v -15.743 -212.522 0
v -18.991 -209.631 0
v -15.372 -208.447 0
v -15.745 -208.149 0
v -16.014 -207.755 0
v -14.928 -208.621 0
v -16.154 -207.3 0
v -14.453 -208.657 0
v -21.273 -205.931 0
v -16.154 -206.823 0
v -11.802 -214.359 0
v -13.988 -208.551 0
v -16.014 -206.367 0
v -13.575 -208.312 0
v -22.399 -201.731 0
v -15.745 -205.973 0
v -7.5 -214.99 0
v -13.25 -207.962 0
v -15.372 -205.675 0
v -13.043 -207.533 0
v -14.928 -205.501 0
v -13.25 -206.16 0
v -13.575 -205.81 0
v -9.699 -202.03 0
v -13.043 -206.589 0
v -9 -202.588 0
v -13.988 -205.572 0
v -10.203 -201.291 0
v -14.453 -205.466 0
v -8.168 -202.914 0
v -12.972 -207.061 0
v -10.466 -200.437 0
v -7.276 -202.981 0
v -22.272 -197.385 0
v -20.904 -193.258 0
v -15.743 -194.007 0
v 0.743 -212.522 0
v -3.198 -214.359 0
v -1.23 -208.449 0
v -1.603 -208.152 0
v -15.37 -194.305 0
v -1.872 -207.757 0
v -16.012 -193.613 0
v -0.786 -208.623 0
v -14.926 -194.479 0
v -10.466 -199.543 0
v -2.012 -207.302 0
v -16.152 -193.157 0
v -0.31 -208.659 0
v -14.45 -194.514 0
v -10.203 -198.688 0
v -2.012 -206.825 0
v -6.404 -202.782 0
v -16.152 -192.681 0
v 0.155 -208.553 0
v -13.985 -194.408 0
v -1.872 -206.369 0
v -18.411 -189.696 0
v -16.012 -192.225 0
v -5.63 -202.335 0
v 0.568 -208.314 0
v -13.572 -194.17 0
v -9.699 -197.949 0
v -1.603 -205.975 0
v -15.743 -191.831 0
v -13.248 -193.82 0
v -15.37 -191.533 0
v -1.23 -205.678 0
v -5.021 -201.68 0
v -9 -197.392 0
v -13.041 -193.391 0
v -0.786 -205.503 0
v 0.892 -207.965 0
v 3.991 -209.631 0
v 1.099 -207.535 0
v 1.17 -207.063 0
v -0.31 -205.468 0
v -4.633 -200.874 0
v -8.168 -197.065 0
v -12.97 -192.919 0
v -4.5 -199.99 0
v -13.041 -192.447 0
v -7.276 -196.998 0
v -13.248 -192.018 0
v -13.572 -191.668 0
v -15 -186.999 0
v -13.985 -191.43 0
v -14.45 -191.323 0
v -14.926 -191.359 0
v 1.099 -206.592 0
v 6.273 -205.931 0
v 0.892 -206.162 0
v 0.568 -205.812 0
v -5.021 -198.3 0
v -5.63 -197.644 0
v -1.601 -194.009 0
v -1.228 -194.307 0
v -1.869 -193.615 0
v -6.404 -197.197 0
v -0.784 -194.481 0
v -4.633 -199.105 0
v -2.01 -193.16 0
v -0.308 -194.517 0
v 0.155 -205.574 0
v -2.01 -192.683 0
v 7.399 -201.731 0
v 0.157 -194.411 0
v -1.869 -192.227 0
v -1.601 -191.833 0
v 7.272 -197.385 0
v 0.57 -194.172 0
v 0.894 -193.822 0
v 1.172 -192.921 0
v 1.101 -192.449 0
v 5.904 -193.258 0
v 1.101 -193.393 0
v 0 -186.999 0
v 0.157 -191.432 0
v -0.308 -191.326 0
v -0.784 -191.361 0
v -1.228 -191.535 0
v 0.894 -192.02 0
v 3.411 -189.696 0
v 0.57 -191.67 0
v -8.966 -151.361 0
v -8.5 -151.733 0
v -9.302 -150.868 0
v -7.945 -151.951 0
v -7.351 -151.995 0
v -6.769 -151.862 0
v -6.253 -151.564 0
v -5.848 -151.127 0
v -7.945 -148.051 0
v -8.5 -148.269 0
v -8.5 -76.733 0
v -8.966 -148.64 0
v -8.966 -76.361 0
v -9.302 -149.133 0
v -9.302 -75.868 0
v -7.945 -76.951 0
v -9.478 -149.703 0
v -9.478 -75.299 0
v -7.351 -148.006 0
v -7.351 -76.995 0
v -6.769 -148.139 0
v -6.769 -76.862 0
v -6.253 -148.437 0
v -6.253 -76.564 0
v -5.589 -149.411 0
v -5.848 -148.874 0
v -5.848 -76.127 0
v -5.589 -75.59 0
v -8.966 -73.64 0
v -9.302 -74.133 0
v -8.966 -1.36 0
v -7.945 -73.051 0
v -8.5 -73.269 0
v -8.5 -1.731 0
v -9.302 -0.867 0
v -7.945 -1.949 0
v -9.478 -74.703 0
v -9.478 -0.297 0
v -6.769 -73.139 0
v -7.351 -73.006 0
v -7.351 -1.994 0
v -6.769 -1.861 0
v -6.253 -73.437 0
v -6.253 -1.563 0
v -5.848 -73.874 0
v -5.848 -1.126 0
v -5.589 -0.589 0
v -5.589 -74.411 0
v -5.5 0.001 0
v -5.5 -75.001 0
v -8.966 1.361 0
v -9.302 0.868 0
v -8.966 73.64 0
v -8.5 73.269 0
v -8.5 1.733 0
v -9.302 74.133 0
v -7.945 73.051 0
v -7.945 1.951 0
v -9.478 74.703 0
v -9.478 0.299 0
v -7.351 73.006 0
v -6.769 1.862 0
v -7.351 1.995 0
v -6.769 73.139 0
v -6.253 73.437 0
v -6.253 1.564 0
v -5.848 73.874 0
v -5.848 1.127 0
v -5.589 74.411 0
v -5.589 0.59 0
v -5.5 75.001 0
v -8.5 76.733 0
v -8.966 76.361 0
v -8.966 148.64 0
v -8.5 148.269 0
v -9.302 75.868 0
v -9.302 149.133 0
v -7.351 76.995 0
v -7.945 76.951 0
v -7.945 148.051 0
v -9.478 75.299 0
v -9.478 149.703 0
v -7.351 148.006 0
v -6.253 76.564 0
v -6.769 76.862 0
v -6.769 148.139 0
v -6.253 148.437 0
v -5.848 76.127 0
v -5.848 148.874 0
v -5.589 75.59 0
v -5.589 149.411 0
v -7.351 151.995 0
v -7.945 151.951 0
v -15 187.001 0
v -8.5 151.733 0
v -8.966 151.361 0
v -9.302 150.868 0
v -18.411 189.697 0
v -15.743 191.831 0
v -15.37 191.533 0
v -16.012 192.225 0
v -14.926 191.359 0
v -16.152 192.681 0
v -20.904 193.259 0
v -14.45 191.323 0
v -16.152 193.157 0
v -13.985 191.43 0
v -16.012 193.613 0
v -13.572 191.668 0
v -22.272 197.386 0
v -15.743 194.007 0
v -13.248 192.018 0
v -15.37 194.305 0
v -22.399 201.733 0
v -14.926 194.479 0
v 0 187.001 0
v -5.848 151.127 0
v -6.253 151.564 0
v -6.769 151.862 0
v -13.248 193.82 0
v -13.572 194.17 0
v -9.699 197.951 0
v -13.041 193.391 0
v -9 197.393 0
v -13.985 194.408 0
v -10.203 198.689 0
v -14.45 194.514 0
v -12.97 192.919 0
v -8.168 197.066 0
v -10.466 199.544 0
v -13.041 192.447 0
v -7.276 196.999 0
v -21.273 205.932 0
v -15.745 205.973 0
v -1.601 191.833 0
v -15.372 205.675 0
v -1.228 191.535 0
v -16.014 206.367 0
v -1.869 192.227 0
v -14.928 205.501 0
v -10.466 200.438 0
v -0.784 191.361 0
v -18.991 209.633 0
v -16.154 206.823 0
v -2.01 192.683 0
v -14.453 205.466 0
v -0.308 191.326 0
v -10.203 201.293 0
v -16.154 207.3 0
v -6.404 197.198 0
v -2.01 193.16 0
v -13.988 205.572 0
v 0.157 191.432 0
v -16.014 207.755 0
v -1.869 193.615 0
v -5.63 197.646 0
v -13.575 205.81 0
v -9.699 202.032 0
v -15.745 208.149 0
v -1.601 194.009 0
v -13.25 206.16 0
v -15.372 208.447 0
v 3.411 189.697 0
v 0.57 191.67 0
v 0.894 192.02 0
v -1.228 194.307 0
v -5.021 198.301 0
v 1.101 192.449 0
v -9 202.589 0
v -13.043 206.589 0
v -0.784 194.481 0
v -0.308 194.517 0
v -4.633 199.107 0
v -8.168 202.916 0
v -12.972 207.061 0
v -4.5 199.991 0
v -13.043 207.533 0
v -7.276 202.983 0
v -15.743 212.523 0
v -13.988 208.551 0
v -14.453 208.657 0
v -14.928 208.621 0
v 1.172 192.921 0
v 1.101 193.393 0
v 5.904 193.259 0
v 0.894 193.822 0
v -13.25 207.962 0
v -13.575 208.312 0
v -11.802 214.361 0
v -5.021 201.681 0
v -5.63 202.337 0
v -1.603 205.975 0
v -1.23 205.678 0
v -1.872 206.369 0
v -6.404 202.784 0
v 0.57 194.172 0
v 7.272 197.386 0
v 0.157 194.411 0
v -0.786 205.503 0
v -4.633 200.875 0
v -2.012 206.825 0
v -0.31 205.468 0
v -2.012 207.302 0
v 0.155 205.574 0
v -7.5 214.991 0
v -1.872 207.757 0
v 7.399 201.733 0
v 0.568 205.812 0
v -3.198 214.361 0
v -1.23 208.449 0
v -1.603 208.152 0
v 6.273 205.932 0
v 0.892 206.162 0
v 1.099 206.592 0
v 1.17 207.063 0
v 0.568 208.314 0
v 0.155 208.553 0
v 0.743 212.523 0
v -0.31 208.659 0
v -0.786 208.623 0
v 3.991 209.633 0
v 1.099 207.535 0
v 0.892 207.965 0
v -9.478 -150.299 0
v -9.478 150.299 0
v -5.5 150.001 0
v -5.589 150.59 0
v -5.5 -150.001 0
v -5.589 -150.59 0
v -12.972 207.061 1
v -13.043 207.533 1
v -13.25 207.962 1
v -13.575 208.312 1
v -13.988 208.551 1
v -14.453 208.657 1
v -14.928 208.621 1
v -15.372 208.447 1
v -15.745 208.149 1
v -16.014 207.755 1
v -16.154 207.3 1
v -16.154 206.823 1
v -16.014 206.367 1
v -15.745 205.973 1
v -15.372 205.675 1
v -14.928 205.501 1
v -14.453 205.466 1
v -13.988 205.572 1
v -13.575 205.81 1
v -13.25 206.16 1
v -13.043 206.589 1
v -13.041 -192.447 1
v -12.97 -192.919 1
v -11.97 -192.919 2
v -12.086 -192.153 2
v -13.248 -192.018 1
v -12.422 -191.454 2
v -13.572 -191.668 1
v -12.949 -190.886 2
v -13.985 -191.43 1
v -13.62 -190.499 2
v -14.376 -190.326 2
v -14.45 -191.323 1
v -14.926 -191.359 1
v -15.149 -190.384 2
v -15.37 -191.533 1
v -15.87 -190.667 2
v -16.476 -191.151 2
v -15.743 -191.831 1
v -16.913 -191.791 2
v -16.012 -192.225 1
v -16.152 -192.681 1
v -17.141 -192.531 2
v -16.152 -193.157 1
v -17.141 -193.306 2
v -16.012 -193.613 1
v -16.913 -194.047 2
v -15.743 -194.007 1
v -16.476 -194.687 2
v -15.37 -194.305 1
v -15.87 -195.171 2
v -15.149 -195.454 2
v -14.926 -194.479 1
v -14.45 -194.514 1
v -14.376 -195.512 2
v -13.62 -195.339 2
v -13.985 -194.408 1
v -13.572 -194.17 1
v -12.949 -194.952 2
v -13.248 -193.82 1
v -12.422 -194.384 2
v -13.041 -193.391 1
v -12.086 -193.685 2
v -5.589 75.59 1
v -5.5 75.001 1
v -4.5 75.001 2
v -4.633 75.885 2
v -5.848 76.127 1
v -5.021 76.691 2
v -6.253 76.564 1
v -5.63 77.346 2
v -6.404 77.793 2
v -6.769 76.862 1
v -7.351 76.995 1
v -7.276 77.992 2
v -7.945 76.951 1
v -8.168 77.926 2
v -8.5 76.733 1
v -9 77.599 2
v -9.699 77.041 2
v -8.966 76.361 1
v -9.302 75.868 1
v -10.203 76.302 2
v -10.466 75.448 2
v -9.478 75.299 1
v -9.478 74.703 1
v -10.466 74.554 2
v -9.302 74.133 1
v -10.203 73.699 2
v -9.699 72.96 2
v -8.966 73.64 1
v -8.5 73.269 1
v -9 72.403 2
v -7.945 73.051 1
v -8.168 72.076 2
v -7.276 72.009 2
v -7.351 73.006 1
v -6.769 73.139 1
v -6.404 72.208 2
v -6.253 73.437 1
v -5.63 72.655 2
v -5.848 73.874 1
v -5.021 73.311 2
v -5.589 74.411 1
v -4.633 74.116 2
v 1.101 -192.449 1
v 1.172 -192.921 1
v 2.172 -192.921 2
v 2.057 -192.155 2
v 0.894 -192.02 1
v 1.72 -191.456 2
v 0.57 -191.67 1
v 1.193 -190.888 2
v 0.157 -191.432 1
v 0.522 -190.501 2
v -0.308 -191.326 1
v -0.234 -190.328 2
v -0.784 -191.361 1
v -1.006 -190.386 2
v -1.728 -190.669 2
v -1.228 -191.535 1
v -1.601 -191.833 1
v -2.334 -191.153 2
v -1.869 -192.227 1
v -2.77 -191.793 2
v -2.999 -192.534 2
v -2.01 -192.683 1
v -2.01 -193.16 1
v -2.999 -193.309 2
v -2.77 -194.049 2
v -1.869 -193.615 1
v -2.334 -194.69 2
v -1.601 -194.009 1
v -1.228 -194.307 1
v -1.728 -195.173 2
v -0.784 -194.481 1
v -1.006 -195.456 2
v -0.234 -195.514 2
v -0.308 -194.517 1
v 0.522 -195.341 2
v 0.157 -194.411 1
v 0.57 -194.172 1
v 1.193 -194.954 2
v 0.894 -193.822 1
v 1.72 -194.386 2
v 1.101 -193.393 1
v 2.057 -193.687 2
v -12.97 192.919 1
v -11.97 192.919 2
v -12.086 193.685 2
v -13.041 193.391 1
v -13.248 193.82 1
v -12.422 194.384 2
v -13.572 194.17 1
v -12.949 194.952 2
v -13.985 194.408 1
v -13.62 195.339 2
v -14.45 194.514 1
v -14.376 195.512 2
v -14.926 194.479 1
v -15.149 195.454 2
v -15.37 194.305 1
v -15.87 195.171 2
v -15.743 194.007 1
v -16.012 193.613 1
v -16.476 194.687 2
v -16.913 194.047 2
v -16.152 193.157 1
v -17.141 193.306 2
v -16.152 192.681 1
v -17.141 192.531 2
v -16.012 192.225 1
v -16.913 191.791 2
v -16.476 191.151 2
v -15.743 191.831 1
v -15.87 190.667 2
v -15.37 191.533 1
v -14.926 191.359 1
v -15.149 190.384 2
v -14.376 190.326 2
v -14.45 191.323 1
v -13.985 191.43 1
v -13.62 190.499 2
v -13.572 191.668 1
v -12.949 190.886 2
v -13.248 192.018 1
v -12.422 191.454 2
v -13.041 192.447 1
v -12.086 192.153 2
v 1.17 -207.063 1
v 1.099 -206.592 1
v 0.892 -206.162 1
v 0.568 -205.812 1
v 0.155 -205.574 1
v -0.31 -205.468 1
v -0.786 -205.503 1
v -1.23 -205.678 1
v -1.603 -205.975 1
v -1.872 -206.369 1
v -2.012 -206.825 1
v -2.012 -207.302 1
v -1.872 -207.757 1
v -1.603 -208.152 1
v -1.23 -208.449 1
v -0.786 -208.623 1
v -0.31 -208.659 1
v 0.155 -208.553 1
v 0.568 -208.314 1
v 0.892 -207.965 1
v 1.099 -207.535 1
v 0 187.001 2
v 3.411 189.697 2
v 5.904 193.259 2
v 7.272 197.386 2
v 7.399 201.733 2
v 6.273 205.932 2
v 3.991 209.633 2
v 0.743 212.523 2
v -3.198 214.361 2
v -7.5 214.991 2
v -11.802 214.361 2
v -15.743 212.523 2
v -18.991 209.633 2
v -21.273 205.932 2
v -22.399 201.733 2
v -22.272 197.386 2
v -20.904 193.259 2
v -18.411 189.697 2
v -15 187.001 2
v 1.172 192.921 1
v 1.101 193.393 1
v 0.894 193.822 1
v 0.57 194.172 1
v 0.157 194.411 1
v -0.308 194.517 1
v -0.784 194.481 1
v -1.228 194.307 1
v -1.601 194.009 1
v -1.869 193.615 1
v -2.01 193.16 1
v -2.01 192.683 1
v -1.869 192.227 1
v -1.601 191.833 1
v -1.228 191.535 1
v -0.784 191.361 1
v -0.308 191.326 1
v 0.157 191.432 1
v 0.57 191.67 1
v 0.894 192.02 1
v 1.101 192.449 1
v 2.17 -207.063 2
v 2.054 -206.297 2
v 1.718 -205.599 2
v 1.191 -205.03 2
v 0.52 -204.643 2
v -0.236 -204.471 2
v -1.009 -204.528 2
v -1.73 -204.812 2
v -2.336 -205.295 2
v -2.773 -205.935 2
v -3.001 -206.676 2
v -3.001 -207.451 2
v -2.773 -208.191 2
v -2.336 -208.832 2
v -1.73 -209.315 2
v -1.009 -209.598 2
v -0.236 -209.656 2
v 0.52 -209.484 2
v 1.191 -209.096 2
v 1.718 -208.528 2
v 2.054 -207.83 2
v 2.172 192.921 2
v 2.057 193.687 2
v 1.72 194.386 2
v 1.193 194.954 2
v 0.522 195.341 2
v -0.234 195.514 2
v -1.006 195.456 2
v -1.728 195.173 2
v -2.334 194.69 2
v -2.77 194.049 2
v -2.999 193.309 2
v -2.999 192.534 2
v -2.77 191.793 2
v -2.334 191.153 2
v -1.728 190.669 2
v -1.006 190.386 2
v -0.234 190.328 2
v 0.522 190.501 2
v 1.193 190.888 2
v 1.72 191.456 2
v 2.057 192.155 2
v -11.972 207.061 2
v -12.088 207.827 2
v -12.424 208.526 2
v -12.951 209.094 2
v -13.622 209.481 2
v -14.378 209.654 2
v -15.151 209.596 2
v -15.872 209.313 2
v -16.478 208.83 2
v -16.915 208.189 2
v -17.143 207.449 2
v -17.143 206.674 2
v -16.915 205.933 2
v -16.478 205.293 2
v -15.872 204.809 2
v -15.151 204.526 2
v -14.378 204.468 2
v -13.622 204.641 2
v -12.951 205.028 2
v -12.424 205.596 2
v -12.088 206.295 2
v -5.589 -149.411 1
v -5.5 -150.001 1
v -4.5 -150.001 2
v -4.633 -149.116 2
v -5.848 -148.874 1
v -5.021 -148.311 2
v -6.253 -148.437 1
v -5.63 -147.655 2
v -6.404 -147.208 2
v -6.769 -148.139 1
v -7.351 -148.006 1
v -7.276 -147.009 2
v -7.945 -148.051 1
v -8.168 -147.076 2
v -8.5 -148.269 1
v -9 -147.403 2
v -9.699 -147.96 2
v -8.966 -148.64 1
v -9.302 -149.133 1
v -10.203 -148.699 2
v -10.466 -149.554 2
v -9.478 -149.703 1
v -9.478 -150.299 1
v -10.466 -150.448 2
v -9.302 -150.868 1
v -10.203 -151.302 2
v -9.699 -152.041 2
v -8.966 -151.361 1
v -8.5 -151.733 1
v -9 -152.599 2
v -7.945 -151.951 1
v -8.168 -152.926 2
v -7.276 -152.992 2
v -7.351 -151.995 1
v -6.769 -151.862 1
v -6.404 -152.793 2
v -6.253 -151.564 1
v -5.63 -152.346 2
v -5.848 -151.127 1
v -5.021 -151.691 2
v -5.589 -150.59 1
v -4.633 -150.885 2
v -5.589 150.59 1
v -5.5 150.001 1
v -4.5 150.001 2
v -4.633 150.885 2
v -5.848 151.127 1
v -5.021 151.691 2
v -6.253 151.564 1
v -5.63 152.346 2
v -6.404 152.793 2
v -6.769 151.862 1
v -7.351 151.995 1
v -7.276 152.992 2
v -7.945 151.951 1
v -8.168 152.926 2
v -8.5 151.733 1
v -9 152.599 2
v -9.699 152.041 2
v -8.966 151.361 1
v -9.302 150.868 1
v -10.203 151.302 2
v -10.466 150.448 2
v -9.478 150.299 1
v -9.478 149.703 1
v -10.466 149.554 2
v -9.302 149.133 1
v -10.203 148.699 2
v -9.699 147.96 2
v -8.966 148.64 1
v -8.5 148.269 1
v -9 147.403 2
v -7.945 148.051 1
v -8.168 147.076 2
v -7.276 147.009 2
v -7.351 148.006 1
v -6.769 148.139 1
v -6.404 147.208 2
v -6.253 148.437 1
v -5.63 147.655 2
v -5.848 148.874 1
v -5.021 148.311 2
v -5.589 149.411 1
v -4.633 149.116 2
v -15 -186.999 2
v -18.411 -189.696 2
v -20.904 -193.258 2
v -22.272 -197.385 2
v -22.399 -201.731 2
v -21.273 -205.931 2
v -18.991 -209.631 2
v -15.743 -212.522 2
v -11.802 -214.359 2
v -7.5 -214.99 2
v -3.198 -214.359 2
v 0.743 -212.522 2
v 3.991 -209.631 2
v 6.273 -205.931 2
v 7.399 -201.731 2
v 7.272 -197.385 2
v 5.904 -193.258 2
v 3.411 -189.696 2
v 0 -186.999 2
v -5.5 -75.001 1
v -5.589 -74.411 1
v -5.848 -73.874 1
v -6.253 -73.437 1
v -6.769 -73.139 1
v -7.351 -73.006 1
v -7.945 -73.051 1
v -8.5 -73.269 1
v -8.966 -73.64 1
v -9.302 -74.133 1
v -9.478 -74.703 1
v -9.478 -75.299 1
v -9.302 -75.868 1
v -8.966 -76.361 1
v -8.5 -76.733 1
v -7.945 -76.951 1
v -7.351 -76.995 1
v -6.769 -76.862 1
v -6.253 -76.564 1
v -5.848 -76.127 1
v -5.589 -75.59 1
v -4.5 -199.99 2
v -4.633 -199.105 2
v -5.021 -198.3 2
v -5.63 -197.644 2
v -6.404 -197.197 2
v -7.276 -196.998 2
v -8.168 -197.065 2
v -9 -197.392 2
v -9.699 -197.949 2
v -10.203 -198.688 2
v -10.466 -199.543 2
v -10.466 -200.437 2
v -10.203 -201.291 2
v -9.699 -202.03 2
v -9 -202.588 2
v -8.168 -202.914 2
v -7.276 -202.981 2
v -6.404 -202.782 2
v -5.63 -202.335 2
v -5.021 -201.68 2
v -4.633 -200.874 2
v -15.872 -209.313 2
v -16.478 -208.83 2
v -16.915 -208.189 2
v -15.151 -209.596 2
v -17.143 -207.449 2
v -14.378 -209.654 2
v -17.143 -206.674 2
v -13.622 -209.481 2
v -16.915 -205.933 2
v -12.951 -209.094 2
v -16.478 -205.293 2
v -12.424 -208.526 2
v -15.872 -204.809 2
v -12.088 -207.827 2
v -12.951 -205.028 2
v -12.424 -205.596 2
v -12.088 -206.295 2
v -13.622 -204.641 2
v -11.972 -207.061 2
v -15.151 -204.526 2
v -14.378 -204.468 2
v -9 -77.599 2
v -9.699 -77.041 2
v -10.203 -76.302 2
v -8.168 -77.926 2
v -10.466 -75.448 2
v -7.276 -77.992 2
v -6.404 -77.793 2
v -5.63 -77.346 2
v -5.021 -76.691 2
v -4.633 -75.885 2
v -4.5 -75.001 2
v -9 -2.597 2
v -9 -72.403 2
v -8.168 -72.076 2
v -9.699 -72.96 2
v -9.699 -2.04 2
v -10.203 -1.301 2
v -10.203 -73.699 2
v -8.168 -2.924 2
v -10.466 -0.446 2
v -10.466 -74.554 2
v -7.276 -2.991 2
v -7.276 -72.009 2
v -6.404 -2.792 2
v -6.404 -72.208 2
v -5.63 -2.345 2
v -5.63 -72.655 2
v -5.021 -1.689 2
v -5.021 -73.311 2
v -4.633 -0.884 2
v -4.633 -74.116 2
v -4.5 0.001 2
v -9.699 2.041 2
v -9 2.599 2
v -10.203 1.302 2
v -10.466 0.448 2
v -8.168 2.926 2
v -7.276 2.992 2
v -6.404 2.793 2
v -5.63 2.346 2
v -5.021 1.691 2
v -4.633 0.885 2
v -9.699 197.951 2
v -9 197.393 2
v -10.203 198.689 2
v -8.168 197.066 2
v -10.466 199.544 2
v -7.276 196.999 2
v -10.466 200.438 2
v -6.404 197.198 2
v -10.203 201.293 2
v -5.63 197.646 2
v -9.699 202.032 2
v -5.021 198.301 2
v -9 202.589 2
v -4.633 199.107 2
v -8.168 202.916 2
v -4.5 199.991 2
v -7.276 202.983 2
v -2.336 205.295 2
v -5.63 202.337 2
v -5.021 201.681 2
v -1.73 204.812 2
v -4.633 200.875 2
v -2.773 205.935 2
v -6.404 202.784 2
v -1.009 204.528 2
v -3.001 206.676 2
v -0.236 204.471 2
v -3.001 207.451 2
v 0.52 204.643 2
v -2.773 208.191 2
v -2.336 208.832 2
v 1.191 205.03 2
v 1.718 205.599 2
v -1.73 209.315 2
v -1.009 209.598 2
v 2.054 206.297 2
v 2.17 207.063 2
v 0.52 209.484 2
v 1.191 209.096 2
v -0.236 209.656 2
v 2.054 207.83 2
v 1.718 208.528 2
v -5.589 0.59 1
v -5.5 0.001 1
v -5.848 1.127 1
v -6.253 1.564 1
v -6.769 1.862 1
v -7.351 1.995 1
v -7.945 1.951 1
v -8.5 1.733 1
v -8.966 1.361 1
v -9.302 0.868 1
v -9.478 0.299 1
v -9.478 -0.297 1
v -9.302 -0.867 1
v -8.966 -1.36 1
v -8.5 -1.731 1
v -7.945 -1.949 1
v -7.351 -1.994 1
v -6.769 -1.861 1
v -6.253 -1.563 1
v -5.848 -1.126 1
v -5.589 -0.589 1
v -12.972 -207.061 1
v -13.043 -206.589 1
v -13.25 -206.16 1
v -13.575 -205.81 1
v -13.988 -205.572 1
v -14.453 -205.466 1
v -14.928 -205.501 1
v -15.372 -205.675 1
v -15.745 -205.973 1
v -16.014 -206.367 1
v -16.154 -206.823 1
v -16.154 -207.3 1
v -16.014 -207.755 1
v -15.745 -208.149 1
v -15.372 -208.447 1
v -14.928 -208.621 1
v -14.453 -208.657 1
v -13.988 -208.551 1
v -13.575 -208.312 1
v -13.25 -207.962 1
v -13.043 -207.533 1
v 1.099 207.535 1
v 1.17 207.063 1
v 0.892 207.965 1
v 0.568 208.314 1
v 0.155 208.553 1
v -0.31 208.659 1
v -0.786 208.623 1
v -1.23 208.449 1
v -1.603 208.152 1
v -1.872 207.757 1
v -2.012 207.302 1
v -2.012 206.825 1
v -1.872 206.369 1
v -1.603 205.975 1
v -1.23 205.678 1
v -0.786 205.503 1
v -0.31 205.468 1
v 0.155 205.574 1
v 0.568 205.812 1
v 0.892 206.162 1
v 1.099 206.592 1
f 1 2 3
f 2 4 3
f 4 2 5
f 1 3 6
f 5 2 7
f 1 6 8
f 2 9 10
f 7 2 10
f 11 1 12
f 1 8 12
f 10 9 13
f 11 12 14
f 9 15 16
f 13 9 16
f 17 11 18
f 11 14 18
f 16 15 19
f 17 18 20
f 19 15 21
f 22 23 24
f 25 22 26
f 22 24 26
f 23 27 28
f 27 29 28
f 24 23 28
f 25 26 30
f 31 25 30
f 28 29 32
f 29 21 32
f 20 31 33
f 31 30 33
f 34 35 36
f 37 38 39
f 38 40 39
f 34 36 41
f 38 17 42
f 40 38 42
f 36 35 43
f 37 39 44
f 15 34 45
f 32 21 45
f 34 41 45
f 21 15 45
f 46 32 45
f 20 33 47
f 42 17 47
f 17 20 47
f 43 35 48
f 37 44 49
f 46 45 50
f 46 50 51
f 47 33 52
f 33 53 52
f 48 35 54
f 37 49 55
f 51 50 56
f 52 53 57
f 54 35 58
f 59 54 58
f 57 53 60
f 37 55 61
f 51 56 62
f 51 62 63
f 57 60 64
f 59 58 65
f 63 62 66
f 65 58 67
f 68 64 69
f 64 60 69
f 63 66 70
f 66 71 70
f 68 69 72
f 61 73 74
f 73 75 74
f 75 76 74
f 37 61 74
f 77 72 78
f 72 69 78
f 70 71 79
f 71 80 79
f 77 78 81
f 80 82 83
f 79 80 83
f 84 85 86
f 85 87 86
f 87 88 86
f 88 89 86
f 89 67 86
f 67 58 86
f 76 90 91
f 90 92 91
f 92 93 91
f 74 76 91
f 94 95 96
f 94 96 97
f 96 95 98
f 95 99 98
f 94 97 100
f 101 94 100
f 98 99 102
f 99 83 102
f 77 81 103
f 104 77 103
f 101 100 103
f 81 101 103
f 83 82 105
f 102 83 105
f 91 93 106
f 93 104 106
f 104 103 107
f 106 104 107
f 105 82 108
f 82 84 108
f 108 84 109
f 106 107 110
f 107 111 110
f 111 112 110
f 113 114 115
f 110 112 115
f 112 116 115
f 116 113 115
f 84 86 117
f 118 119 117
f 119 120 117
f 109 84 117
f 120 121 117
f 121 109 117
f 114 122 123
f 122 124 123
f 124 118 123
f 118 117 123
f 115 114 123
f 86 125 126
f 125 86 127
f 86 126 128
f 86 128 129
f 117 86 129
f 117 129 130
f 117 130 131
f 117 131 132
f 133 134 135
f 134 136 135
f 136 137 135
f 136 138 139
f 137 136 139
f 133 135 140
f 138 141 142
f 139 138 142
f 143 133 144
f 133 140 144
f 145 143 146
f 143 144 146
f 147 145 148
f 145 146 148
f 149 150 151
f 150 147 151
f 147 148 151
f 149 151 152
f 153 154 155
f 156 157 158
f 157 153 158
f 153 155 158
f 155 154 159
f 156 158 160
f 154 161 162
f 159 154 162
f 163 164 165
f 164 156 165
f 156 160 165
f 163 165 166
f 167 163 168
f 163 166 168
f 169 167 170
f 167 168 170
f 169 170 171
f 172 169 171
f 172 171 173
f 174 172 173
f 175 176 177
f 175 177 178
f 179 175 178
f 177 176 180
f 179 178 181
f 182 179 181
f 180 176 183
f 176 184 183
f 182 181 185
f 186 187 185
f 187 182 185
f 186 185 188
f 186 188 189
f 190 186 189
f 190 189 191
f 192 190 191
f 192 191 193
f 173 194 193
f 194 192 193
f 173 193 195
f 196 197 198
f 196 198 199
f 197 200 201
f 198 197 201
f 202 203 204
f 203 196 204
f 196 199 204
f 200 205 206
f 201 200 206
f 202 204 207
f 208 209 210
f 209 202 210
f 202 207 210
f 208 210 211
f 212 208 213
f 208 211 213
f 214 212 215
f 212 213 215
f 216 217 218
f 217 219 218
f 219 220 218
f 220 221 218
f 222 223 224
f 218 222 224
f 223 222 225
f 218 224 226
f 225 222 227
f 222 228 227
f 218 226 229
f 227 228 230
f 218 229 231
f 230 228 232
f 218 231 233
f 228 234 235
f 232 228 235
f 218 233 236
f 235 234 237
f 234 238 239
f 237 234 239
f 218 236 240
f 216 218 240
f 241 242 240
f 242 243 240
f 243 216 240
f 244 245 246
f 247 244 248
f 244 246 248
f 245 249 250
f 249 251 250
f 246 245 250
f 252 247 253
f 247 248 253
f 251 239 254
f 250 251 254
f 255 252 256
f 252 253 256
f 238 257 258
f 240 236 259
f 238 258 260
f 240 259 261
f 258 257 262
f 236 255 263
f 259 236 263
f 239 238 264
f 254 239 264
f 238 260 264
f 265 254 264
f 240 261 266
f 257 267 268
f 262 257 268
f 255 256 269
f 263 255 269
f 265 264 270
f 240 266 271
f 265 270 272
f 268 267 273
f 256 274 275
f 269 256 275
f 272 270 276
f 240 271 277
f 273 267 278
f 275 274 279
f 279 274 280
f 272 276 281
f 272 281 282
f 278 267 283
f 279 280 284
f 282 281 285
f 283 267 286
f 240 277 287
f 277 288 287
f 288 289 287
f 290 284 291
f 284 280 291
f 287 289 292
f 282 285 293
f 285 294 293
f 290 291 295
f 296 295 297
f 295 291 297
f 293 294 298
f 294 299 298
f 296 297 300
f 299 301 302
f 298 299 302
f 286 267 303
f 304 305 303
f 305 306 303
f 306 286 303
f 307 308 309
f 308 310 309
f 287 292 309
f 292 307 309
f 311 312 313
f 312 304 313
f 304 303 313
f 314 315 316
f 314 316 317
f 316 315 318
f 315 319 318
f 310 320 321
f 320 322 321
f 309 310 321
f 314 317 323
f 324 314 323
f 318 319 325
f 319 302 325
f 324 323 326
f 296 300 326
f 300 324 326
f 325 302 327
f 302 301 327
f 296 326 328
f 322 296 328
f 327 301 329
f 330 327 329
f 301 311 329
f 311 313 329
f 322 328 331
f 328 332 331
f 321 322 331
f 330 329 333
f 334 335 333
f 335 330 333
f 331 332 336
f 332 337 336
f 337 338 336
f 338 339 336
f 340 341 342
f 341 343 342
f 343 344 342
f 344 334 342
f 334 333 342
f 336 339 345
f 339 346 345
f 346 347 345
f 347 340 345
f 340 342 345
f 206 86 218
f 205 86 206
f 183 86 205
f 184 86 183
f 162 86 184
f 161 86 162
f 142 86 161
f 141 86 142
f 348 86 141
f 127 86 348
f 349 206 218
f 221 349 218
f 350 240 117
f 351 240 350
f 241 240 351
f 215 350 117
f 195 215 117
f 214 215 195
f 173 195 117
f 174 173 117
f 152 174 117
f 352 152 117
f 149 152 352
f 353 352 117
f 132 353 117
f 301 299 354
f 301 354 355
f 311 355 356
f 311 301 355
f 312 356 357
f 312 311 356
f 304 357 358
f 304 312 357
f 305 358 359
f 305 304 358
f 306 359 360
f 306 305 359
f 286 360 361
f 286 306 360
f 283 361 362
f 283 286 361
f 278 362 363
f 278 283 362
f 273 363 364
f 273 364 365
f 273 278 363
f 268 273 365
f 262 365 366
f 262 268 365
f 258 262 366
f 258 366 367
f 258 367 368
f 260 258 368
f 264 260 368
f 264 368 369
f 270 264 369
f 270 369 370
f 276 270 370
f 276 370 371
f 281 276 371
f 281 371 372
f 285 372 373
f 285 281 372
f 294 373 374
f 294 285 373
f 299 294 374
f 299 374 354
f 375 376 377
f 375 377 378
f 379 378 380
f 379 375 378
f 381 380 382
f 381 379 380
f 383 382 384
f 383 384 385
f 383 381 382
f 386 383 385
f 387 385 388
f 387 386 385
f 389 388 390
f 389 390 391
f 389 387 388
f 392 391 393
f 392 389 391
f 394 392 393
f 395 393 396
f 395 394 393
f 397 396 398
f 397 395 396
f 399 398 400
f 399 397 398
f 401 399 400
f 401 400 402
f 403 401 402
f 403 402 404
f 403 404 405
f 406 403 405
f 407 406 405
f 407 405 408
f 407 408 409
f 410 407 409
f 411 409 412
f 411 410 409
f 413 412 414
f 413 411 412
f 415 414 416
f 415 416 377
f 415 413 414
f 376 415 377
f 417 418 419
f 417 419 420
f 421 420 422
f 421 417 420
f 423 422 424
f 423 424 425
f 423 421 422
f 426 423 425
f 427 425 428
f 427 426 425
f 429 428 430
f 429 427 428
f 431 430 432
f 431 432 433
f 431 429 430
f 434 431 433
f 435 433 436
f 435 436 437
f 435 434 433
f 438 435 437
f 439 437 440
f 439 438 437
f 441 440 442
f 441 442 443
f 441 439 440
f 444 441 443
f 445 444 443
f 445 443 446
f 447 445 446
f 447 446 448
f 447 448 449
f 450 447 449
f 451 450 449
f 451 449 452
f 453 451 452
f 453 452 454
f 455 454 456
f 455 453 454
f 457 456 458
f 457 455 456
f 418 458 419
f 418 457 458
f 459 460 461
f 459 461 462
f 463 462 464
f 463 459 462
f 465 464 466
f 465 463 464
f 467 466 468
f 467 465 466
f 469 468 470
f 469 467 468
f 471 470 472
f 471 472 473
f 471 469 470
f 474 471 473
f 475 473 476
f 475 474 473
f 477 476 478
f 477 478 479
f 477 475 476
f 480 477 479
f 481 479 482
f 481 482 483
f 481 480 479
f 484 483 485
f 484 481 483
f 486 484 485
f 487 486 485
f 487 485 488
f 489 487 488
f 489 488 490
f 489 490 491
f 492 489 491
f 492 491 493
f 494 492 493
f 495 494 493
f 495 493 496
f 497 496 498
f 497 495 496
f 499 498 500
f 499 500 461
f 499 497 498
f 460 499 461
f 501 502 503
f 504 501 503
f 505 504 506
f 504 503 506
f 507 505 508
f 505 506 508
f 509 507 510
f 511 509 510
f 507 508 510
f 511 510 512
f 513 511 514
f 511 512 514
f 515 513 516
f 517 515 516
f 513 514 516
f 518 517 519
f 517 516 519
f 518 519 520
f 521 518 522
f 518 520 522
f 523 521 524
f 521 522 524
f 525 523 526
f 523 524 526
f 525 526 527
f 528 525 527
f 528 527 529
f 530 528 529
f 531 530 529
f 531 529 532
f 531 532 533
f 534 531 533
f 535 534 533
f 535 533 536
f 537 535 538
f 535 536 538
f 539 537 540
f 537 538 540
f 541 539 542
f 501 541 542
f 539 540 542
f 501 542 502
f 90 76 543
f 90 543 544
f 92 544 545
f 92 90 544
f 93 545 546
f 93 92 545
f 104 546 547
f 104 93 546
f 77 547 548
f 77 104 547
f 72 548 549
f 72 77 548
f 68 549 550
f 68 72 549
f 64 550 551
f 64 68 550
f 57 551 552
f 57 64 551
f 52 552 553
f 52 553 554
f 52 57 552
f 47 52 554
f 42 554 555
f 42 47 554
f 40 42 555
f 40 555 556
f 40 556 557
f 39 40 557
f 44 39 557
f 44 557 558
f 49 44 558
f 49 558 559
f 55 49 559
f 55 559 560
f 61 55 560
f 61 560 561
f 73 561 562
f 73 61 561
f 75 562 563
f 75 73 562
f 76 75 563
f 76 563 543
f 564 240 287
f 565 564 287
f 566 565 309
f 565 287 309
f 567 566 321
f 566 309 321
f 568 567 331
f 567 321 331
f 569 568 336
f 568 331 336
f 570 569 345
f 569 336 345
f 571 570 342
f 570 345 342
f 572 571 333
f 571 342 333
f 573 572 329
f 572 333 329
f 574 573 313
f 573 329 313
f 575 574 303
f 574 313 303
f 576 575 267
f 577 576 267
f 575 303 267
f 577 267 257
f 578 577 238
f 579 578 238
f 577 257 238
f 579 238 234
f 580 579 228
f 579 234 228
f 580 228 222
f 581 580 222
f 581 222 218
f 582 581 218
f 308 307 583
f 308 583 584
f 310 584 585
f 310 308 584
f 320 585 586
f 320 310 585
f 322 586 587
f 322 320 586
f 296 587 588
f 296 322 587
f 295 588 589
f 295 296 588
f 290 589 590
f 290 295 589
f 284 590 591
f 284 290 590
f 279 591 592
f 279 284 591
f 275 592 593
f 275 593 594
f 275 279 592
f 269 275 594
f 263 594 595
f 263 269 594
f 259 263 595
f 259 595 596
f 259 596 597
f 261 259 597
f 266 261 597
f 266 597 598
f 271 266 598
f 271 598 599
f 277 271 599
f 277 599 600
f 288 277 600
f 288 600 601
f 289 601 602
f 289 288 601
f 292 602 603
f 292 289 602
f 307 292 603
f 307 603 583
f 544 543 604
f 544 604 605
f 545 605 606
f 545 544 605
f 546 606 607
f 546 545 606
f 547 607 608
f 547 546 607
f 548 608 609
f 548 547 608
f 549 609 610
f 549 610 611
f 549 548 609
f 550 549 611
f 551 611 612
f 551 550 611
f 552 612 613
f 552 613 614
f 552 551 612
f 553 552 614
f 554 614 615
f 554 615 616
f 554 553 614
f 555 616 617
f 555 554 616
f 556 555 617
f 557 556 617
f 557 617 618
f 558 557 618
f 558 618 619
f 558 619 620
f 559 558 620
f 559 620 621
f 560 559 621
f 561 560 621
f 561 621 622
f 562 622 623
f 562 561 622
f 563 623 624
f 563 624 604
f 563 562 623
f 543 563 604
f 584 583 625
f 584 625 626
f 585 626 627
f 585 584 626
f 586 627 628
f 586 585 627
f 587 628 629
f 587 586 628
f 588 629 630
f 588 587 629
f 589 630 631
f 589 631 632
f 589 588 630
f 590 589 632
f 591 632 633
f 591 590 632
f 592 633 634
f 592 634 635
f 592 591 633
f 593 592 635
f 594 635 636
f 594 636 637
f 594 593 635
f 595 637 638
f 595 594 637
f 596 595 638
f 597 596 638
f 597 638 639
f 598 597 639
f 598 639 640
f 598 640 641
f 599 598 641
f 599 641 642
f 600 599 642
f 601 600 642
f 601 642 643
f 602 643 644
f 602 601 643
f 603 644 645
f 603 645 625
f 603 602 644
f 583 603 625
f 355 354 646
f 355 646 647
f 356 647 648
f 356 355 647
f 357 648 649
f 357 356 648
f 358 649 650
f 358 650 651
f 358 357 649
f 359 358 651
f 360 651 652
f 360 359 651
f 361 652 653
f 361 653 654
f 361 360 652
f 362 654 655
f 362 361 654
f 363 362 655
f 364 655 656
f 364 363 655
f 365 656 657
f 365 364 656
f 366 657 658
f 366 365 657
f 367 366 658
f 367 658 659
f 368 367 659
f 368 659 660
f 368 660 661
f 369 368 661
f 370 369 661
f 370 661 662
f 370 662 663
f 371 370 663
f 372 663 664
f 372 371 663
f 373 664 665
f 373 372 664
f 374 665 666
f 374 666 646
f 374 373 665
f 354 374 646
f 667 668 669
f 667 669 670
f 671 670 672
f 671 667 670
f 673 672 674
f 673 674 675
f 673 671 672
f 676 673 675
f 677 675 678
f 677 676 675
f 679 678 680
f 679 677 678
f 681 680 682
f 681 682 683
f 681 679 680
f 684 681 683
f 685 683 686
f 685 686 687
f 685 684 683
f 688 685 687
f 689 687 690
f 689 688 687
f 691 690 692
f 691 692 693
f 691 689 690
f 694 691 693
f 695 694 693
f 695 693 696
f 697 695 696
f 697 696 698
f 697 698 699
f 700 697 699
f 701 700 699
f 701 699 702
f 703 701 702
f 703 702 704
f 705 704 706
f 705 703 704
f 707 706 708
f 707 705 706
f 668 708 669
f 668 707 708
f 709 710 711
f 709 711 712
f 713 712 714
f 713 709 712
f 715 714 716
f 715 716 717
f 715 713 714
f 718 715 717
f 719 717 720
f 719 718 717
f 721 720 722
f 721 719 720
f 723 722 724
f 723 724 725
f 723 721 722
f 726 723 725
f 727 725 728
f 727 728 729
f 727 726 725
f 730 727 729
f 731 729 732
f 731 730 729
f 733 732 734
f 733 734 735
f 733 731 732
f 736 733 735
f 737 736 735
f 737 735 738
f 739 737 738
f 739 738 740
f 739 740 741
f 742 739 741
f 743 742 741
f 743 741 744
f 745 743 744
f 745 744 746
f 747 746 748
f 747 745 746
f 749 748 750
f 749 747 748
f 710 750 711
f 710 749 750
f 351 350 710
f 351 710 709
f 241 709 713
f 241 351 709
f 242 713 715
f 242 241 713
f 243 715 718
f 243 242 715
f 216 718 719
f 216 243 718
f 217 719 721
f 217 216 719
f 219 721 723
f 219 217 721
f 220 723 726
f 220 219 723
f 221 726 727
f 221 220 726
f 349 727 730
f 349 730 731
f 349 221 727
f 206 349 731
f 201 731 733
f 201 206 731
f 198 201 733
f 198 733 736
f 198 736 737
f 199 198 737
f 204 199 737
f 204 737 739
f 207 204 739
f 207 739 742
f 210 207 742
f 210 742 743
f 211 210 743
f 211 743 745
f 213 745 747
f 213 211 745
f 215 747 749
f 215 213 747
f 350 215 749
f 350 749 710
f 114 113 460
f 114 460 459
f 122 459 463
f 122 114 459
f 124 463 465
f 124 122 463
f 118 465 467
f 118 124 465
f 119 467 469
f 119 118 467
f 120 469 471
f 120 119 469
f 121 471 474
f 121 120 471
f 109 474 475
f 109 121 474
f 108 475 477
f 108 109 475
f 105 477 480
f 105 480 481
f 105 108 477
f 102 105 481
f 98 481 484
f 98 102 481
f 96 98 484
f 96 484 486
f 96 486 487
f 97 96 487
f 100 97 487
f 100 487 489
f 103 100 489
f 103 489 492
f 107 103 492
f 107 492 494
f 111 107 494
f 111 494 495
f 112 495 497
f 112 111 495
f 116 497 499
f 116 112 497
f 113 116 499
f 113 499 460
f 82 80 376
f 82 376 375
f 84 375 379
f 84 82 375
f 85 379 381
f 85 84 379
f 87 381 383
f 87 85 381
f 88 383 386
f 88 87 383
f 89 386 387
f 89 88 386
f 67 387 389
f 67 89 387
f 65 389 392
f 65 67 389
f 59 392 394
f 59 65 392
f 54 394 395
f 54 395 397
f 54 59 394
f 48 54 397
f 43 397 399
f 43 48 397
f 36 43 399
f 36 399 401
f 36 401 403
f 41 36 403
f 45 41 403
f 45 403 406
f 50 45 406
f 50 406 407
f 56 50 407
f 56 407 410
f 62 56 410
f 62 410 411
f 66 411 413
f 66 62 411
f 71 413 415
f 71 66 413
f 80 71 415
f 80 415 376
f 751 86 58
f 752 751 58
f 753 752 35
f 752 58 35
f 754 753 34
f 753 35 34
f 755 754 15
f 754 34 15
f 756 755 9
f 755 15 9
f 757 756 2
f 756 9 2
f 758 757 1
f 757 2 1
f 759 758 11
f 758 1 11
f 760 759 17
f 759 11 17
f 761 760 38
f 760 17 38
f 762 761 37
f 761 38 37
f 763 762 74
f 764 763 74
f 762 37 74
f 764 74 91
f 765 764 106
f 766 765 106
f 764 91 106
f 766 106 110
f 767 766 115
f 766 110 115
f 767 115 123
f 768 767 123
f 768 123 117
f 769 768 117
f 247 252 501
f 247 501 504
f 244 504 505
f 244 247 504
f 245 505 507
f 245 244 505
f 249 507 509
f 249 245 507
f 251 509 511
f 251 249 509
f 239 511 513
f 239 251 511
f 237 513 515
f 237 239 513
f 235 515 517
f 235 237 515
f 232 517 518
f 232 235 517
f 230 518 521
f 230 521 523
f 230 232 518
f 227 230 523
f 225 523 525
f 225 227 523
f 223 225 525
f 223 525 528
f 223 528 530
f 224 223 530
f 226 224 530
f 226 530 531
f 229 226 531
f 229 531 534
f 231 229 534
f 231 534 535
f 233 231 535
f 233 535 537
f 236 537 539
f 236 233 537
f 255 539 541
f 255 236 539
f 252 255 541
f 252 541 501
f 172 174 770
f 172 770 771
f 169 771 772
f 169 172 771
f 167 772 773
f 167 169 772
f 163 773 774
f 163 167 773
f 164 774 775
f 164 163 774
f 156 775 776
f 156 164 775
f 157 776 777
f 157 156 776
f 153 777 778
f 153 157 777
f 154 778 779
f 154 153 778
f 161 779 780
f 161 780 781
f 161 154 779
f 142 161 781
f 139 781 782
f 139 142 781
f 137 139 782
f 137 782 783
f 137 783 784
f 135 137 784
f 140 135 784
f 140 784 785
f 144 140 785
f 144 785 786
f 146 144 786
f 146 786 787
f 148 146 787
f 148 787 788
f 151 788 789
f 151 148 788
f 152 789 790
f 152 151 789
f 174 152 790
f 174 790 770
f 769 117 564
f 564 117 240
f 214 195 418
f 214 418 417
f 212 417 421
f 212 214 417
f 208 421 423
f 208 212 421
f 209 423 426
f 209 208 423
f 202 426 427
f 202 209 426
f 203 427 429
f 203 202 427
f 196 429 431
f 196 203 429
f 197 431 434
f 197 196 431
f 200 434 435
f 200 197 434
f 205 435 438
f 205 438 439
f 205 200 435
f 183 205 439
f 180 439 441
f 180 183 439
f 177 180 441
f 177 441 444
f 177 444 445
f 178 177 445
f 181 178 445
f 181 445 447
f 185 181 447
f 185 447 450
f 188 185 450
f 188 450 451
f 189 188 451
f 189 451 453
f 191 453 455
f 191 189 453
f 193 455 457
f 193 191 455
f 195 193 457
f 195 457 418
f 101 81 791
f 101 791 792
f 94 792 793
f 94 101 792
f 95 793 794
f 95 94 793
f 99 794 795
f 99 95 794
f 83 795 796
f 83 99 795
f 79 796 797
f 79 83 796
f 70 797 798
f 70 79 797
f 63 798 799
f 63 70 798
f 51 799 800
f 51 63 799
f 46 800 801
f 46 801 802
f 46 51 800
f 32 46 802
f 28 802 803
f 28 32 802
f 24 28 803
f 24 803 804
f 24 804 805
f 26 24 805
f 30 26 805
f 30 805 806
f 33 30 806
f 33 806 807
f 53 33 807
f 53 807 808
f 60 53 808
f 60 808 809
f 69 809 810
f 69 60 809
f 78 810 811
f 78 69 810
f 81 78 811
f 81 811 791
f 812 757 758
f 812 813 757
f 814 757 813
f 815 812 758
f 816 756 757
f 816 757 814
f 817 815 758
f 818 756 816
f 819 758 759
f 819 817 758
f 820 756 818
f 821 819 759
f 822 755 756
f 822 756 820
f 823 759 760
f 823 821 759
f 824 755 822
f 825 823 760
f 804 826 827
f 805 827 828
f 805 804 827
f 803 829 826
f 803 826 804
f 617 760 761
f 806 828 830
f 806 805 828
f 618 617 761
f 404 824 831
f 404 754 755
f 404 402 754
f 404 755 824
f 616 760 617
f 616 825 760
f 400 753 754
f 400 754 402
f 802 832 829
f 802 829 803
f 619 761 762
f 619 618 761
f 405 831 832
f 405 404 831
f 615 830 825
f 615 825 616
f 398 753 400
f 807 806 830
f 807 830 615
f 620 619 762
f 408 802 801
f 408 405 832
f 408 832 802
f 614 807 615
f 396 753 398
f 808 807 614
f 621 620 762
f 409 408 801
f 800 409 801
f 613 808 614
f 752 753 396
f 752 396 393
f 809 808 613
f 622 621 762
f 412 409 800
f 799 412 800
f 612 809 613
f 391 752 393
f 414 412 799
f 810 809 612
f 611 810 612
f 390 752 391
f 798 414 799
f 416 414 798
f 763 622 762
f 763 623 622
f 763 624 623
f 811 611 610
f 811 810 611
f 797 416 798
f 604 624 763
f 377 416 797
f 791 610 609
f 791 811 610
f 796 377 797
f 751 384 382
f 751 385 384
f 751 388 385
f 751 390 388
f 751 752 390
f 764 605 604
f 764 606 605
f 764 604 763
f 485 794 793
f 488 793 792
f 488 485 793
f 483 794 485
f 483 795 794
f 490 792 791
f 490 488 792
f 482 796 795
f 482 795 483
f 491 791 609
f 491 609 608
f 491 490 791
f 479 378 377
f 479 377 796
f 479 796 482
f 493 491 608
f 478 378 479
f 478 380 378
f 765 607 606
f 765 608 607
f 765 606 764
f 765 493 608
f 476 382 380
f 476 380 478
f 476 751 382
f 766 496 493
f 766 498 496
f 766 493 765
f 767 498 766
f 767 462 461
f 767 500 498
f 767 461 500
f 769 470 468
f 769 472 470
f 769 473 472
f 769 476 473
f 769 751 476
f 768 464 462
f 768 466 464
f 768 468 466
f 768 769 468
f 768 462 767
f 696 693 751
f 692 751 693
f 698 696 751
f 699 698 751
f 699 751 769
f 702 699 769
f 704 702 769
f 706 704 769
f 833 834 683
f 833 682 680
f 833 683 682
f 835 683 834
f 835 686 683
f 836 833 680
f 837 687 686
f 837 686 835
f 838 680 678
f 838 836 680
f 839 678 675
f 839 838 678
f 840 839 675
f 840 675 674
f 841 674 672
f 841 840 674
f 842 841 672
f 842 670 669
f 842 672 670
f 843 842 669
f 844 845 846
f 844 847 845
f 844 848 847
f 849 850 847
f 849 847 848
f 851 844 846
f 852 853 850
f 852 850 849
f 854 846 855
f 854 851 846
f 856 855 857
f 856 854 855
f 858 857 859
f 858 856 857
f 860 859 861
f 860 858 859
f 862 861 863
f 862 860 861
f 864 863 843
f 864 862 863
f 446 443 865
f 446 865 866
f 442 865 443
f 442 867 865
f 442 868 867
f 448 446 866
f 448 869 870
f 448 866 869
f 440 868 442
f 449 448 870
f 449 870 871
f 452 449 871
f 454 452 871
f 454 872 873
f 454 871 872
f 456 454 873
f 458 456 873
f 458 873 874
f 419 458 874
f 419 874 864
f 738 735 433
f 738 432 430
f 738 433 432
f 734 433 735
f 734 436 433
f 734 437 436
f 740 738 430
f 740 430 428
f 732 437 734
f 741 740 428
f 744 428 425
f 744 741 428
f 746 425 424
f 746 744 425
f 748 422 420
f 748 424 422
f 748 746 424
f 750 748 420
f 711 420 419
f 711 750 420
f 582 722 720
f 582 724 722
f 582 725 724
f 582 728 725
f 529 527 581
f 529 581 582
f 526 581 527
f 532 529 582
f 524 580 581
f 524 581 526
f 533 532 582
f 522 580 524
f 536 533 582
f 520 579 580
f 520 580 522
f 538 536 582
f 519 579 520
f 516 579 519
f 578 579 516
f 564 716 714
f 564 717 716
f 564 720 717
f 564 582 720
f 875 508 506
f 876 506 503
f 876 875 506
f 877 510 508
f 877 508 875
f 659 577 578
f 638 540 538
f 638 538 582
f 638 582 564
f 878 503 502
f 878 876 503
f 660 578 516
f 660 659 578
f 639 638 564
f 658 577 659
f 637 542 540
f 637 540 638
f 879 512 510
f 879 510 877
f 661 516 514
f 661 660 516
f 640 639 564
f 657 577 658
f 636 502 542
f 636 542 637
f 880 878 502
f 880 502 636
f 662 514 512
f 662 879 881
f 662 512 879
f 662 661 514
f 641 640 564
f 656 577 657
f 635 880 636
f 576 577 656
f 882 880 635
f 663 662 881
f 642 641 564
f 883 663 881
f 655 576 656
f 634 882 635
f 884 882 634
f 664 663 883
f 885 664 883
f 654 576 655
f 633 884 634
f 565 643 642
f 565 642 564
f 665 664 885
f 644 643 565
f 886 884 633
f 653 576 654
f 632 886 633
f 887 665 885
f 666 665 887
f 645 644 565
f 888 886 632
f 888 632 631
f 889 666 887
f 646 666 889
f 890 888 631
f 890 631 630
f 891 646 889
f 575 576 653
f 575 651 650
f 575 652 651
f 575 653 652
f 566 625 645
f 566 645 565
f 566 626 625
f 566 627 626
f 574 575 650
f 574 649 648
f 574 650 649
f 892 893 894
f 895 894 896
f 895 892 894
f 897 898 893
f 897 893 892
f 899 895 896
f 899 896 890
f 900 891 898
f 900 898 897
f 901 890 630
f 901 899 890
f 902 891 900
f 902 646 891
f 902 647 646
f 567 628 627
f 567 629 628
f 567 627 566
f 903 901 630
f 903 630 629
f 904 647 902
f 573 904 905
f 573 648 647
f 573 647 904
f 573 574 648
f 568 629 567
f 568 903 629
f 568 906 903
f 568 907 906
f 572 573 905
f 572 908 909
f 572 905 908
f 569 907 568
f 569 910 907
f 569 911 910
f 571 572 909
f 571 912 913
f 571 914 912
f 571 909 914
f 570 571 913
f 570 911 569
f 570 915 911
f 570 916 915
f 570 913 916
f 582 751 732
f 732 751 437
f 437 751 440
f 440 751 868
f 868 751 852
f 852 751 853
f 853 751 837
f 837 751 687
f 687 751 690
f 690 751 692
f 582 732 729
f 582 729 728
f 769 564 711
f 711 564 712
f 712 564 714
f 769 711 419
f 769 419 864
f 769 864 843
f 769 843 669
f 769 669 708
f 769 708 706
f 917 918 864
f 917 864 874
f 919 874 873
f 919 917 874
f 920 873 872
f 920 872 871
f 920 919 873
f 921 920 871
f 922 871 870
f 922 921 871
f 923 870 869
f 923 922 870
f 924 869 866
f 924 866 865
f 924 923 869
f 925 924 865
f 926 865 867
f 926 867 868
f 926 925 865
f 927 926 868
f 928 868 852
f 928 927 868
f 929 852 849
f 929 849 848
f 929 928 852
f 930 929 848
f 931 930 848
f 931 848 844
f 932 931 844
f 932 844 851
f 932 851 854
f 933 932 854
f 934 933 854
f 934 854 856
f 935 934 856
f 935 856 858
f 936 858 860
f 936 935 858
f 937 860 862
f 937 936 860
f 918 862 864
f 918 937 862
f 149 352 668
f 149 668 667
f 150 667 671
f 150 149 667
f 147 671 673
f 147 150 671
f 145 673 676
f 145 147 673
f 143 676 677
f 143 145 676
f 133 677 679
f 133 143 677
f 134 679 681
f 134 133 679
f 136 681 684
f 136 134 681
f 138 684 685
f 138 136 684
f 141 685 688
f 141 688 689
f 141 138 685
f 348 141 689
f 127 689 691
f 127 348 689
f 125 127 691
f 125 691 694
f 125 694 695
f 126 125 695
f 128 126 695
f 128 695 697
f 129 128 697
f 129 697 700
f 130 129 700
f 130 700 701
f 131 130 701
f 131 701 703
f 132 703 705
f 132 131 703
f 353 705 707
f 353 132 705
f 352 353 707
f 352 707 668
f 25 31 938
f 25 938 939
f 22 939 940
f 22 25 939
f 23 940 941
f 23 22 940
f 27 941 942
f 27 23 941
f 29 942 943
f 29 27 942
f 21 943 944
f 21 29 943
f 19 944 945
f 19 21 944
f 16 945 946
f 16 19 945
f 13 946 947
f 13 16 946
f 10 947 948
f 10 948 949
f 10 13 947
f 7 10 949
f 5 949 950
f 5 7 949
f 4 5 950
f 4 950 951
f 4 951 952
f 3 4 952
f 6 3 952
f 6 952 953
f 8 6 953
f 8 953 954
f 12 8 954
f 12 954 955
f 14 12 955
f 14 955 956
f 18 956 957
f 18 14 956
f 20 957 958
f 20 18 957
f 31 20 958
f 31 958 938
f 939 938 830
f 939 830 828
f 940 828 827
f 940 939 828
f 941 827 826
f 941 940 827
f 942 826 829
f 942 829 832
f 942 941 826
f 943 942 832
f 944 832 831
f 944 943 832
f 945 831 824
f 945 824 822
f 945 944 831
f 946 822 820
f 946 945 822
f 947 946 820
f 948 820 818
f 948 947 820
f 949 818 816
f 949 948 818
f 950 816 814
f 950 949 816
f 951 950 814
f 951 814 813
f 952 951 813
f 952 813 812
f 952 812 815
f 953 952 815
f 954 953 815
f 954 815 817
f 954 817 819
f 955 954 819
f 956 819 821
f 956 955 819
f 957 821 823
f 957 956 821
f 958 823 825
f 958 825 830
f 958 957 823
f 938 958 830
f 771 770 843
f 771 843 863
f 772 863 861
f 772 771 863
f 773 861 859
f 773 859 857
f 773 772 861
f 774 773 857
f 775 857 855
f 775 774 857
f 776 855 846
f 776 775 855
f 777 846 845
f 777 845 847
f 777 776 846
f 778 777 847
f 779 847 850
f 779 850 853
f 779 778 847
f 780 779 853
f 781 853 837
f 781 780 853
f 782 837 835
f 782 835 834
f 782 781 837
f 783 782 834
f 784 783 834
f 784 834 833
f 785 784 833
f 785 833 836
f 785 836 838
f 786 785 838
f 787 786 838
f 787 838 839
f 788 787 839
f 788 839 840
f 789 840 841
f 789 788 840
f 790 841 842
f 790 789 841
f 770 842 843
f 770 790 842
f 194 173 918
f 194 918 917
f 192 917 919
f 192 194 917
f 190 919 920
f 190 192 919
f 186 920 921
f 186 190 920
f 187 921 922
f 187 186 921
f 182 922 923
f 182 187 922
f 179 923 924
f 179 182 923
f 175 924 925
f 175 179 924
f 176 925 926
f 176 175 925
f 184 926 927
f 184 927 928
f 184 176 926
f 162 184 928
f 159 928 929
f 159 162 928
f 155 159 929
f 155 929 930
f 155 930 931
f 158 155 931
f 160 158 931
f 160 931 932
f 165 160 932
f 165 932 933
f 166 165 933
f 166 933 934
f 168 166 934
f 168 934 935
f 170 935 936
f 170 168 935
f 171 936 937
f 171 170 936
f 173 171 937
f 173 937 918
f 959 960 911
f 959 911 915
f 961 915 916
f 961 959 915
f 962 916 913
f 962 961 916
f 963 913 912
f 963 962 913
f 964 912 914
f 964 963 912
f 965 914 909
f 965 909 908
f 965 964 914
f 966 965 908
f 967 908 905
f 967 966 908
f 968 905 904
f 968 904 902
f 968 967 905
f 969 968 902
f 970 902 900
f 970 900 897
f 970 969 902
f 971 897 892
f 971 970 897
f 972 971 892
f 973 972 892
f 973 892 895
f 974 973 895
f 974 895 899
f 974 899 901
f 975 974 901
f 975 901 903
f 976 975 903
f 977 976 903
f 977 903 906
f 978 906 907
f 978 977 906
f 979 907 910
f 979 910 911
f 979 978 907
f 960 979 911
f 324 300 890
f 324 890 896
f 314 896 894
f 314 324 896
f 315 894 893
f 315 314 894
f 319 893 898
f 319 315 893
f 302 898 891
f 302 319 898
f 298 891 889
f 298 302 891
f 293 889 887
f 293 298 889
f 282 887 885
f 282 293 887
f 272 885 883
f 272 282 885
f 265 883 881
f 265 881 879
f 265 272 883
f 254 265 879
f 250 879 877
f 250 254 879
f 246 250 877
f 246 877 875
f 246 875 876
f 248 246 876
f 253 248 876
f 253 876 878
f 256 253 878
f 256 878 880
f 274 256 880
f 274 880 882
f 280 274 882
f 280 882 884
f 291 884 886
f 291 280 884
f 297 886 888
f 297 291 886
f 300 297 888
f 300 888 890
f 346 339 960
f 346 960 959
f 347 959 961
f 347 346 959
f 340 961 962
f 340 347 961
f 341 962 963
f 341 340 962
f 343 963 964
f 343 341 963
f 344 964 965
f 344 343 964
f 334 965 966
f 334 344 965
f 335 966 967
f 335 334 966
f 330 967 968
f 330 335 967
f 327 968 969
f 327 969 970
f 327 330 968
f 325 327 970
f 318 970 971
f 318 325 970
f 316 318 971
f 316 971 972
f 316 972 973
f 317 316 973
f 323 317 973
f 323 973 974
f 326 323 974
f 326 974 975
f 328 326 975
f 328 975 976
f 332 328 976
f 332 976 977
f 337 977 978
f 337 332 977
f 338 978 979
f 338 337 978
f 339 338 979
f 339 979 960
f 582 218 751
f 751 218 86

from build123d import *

# Parameters (mm, degrees)
F0_R     = 1.6
F0_R_2   = 3
F0_R_3   = 2
F1_DEPTH = 2
F2_SIZE  = 1
F3_SIZE  = 1
F4_SIZE  = 1
F5_SIZE  = 1


with BuildPart() as f1:
    # F0 (on Top) → F1 (new body)
    with BuildSketch(Plane.XY):
        with BuildLine():
            ThreePointArc((0, 187.000727), (-7.5, 214.991108), (-15, 187.000727))
            Line((-15, 187.000727), (-15, -186.999273))
            ThreePointArc((-15, -186.999273), (-7.5, -214.989654), (0, -186.999273))
            Line((0, -186.999273), (0, 187.000727))
        make_face()
        with Locations((-14.572135, -207.061108)):
            Circle(F0_R, mode=Mode.SUBTRACT)
        with Locations((-14.57, -192.918972)):
            Circle(F0_R, mode=Mode.SUBTRACT)
        with Locations((-7.5, -199.989654)):
            Circle(F0_R_2, mode=Mode.SUBTRACT)
        with Locations((-0.43, -207.063243)):
            Circle(F0_R, mode=Mode.SUBTRACT)
        with Locations((-0.427865, -192.921108)):
            Circle(F0_R, mode=Mode.SUBTRACT)
        with Locations((-7.5, -150.000727)):
            Circle(F0_R_3, mode=Mode.SUBTRACT)
        with Locations((-7.5, -75.000727)):
            Circle(F0_R_3, mode=Mode.SUBTRACT)
        with Locations((-14.57, 192.918972)):
            Circle(F0_R, mode=Mode.SUBTRACT)
        with Locations((-14.572135, 207.061108)):
            Circle(F0_R, mode=Mode.SUBTRACT)
        with Locations((-7.5, 0.000727)):
            Circle(F0_R_3, mode=Mode.SUBTRACT)
        with Locations((-7.5, 75.000727)):
            Circle(F0_R_3, mode=Mode.SUBTRACT)
        with Locations((-7.5, 150.000727)):
            Circle(F0_R_3, mode=Mode.SUBTRACT)
        with Locations((-7.5, 199.991108)):
            Circle(F0_R_2, mode=Mode.SUBTRACT)
        with Locations((-0.427865, 192.921108)):
            Circle(F0_R, mode=Mode.SUBTRACT)
        with Locations((-0.43, 207.063243)):
            Circle(F0_R, mode=Mode.SUBTRACT)
    extrude(amount=F1_DEPTH)

    # F2
    f2_edges = [f1.edges().sort_by_distance(p)[0] for p in [
        (-16.17, 192.918972, 2),
    ]]
    chamfer(f2_edges, length=F2_SIZE)

    # F3
    f3_edges = [f1.edges().sort_by_distance(p)[0] for p in [
        (-16.172135, 207.061108, 2),
        (-2.03, 207.063243, 2),
        (-2.027865, 192.921108, 2),
    ]]
    chamfer(f3_edges, length=F3_SIZE)

    # F4
    f4_edges = [f1.edges().sort_by_distance(p)[0] for p in [
        (-16.17, -192.918972, 2),
        (-16.172135, -207.061108, 2),
        (-2.03, -207.063243, 2),
        (-2.027865, -192.921108, 2),
    ]]
    chamfer(f4_edges, length=F4_SIZE)

    # F5
    f5_edges = [f1.edges().sort_by_distance(p)[0] for p in [
        (-9.5, 150.000727, 2),
        (-9.5, 75.000727, 2),
        (-9.5, 0.000727, 2),
        (-9.5, -75.000727, 2),
        (-9.5, -150.000727, 2),
    ]]
    chamfer(f5_edges, length=F5_SIZE)


solid = f1.part
